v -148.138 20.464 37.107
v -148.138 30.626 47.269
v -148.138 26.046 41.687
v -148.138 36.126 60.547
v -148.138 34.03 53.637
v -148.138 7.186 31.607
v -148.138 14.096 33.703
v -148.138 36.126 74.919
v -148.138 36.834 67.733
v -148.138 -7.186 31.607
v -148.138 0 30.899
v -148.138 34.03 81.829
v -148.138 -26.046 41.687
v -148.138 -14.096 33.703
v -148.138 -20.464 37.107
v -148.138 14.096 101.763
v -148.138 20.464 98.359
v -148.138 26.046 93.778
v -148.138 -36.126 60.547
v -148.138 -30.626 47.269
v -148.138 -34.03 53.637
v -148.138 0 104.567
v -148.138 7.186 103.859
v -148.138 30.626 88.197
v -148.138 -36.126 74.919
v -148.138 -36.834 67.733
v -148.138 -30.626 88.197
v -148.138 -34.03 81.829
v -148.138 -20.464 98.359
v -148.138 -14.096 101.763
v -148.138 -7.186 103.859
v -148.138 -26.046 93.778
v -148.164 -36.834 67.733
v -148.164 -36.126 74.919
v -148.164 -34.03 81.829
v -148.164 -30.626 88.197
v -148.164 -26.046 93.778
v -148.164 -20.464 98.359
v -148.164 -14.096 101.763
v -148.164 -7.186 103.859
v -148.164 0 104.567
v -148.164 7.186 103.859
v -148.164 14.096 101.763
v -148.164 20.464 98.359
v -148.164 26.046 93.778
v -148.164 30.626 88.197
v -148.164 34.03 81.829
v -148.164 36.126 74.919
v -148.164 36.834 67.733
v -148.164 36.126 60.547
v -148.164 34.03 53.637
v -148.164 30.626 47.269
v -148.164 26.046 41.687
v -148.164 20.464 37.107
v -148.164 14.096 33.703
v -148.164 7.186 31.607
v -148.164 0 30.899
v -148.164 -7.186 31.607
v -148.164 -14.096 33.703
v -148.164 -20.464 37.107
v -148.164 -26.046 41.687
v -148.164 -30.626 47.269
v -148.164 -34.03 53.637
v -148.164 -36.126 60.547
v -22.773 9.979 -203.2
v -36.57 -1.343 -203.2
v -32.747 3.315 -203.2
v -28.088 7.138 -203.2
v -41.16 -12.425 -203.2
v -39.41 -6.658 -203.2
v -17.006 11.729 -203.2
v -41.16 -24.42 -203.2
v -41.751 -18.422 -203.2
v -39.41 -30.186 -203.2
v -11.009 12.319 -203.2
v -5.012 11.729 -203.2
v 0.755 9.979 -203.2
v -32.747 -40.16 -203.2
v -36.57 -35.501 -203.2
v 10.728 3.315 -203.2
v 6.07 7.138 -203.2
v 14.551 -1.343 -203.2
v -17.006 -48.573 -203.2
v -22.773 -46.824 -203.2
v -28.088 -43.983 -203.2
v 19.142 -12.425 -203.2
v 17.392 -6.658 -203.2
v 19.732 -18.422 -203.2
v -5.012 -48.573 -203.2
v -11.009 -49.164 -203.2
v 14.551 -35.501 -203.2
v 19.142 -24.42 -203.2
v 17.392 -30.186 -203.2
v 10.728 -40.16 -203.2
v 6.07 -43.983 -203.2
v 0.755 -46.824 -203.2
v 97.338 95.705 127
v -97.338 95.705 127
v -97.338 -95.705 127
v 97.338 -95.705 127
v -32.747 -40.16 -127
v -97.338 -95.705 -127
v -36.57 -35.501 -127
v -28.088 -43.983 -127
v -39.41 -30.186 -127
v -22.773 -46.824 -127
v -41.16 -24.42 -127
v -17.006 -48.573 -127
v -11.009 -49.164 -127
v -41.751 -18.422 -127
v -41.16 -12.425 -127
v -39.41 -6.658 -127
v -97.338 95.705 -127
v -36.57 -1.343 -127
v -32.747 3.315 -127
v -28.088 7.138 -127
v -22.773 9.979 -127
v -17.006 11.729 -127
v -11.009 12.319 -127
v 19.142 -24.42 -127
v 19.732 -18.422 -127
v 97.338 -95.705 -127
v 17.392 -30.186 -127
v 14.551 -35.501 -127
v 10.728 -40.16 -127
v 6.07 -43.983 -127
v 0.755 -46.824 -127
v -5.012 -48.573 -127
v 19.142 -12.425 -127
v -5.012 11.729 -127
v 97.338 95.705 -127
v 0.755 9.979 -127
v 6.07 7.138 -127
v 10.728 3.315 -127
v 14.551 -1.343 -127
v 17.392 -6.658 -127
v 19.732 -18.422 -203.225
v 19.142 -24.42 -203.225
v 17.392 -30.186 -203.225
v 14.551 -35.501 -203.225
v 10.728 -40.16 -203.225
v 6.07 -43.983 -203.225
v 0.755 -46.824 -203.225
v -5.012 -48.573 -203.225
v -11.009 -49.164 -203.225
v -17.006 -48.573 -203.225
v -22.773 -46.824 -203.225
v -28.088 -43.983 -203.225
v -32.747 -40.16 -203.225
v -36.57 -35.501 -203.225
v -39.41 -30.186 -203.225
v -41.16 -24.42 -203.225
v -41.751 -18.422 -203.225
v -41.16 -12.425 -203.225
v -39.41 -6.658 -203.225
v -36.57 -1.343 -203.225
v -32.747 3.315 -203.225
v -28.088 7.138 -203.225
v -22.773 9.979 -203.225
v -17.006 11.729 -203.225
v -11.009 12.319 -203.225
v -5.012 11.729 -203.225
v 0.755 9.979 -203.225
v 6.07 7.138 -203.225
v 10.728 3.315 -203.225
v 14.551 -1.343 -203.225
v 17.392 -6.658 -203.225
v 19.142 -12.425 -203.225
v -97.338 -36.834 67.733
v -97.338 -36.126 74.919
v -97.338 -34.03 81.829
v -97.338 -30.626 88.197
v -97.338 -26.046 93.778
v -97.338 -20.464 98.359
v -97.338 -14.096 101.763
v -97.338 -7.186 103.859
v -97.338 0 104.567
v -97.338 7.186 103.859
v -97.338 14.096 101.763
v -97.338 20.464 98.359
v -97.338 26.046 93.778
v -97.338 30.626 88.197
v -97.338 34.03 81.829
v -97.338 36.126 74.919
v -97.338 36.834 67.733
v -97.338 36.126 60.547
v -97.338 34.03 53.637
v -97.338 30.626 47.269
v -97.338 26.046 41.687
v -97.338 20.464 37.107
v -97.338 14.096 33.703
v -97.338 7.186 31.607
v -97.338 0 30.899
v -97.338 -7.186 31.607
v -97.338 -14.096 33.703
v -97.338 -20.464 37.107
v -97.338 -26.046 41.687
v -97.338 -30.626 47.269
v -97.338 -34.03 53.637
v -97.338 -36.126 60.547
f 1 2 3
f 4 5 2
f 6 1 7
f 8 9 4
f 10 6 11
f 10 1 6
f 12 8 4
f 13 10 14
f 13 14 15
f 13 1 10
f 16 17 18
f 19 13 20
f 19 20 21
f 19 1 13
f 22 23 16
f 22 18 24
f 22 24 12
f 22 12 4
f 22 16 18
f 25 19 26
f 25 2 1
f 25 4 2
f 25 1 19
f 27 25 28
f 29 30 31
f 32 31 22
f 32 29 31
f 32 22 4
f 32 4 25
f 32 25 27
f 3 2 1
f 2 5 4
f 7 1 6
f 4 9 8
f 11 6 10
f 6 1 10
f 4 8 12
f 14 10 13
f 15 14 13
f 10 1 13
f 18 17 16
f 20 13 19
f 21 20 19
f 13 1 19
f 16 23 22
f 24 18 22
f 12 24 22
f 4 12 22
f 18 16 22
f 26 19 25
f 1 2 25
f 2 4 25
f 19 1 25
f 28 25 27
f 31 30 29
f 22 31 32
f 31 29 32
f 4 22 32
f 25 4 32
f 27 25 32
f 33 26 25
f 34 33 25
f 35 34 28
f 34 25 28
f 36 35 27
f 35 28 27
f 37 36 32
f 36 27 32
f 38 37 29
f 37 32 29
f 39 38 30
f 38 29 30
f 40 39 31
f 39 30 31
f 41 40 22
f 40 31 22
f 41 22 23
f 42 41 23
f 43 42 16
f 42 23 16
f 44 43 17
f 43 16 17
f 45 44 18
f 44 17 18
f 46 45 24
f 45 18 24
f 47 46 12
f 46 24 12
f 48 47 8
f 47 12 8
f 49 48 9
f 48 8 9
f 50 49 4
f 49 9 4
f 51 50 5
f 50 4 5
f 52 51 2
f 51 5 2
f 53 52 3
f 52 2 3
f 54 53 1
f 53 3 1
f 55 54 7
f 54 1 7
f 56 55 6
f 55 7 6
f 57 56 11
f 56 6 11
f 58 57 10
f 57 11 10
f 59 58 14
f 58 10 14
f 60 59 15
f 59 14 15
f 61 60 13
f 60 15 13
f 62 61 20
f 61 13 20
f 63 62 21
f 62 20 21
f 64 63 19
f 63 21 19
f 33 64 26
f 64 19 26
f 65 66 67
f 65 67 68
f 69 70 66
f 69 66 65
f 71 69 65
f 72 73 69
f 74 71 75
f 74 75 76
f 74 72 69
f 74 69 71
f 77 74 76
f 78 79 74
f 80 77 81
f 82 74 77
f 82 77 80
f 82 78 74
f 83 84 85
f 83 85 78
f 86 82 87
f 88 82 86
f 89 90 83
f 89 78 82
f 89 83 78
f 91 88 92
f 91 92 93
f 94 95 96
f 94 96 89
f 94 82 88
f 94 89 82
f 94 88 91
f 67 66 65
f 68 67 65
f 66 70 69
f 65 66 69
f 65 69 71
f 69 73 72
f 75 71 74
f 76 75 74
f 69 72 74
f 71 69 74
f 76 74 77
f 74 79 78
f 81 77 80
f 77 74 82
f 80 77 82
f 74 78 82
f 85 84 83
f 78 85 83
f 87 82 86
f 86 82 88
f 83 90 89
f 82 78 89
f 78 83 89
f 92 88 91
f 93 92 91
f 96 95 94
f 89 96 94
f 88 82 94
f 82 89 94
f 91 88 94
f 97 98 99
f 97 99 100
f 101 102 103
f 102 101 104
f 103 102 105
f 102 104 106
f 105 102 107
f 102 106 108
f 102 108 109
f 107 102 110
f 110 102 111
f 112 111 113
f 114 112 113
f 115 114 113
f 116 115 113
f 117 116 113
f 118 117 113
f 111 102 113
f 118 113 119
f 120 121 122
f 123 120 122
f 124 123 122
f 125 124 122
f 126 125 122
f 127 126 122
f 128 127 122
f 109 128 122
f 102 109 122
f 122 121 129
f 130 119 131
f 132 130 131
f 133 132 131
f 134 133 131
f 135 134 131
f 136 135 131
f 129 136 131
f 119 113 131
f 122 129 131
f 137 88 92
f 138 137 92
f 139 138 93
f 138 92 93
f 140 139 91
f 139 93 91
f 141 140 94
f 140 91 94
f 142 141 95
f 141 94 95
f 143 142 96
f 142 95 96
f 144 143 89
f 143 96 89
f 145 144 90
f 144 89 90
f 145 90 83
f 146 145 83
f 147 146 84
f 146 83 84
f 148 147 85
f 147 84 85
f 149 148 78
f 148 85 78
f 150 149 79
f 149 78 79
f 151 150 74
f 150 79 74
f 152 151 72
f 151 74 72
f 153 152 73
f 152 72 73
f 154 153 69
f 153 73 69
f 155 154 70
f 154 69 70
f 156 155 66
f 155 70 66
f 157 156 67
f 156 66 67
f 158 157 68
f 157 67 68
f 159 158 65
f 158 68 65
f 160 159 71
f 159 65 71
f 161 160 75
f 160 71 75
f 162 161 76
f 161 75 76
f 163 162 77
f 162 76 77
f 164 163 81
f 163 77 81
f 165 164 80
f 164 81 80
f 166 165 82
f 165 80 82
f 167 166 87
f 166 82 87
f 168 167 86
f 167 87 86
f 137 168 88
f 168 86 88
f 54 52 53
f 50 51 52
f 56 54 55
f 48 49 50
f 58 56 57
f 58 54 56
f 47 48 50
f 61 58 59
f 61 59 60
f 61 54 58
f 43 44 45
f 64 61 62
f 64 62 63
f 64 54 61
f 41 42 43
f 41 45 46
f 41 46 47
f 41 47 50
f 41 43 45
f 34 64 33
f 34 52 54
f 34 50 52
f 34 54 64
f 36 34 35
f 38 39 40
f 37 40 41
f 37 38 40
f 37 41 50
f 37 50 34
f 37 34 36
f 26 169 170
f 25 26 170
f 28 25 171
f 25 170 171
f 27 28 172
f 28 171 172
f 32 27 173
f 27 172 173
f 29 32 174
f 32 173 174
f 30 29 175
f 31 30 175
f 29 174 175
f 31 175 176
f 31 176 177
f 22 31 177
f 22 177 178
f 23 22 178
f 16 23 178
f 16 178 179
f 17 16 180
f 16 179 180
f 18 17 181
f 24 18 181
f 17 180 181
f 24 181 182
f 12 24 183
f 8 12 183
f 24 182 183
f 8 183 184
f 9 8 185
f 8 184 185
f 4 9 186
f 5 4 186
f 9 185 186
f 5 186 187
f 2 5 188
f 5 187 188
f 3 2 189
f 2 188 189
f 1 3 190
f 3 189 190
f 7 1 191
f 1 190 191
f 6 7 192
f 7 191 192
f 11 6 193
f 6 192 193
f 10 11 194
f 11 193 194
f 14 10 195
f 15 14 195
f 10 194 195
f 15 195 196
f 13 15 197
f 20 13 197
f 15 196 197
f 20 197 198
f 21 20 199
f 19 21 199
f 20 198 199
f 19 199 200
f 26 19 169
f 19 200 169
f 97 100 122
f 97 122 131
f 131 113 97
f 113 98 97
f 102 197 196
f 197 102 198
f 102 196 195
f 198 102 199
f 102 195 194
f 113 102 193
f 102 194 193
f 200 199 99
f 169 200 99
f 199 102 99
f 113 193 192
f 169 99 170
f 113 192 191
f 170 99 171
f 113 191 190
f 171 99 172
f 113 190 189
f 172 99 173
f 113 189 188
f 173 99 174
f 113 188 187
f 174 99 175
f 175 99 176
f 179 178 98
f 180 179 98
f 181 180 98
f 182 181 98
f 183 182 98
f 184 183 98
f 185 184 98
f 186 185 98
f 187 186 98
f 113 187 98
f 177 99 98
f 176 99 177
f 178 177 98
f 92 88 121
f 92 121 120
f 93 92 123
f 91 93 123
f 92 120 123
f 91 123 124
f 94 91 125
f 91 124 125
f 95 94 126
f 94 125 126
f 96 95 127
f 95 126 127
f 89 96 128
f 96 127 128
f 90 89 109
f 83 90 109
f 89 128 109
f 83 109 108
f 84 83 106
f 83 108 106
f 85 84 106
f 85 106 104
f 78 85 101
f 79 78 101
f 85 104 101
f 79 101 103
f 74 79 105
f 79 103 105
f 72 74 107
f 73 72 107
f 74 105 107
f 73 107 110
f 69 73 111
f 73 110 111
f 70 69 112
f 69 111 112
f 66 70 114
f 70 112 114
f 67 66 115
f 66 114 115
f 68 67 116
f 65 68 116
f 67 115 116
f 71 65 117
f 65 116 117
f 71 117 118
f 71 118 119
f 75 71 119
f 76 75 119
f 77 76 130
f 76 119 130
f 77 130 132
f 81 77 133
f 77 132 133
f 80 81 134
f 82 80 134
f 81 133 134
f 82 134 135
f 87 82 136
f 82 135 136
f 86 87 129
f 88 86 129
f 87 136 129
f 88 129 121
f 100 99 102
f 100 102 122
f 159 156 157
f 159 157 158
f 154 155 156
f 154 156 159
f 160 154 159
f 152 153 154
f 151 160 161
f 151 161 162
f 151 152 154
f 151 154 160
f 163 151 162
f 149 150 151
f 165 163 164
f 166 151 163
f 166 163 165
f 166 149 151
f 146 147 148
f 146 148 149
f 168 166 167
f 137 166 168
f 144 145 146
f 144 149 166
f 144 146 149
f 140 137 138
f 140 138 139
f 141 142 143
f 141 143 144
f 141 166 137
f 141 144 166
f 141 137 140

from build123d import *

# Parameters (mm, degrees)
F0_W      = 194.676966
F0_H      = 191.409708
F1_DEPTH  = 127
F2_R      = 36.833921
F3_DEPTH  = 50.8
F4_R      = 30.741414
F5_DEPTH  = 76.2
F3_FACE_R = 36.833921
F6_DEPTH  = 0.0254
F5_FACE_R = 30.741414
F7_DEPTH  = 0.0254


with BuildPart() as f1:
    # F0 (on Top) → F1 (new body, symmetric)
    with BuildSketch(Plane.XY):
        Rectangle(F0_W, F0_H)
    extrude(amount=F1_DEPTH, both=True)

    # F2 (on face) → F3 (join)
    with BuildSketch(Plane(origin=(-97.338483, 0, 0), x_dir=(0, -1, 0), z_dir=(-1, 0, 0))):
        with Locations((0, 67.732848)):
            Circle(F2_R)
    extrude(amount=F3_DEPTH)

    # F4 (on face) → F5 (join)
    with BuildSketch(Plane(origin=(0, 0, -127), x_dir=(1, 0, 0), z_dir=(0, 0, -1))):
        with Locations((-11.009098, 18.422194)):
            Circle(F4_R)
    extrude(amount=F5_DEPTH)


with BuildPart() as f6:
    # F3_face (on face) → F6 (new body)
    with BuildSketch(Plane(origin=(-148.138483, 0, 67.732848), x_dir=(0, -1, 0), z_dir=(-1, 0, 0))):
        Circle(F3_FACE_R)
    extrude(amount=F6_DEPTH)


with BuildPart() as f7:
    # F5_face (on face) → F7 (new body)
    with BuildSketch(Plane(origin=(-11.009098, -18.422194, -203.2), x_dir=(1, 0, 0), z_dir=(0, 0, -1))):
        Circle(F5_FACE_R)
    extrude(amount=F7_DEPTH)


solid = Compound([f1.part, f6.part, f7.part])
